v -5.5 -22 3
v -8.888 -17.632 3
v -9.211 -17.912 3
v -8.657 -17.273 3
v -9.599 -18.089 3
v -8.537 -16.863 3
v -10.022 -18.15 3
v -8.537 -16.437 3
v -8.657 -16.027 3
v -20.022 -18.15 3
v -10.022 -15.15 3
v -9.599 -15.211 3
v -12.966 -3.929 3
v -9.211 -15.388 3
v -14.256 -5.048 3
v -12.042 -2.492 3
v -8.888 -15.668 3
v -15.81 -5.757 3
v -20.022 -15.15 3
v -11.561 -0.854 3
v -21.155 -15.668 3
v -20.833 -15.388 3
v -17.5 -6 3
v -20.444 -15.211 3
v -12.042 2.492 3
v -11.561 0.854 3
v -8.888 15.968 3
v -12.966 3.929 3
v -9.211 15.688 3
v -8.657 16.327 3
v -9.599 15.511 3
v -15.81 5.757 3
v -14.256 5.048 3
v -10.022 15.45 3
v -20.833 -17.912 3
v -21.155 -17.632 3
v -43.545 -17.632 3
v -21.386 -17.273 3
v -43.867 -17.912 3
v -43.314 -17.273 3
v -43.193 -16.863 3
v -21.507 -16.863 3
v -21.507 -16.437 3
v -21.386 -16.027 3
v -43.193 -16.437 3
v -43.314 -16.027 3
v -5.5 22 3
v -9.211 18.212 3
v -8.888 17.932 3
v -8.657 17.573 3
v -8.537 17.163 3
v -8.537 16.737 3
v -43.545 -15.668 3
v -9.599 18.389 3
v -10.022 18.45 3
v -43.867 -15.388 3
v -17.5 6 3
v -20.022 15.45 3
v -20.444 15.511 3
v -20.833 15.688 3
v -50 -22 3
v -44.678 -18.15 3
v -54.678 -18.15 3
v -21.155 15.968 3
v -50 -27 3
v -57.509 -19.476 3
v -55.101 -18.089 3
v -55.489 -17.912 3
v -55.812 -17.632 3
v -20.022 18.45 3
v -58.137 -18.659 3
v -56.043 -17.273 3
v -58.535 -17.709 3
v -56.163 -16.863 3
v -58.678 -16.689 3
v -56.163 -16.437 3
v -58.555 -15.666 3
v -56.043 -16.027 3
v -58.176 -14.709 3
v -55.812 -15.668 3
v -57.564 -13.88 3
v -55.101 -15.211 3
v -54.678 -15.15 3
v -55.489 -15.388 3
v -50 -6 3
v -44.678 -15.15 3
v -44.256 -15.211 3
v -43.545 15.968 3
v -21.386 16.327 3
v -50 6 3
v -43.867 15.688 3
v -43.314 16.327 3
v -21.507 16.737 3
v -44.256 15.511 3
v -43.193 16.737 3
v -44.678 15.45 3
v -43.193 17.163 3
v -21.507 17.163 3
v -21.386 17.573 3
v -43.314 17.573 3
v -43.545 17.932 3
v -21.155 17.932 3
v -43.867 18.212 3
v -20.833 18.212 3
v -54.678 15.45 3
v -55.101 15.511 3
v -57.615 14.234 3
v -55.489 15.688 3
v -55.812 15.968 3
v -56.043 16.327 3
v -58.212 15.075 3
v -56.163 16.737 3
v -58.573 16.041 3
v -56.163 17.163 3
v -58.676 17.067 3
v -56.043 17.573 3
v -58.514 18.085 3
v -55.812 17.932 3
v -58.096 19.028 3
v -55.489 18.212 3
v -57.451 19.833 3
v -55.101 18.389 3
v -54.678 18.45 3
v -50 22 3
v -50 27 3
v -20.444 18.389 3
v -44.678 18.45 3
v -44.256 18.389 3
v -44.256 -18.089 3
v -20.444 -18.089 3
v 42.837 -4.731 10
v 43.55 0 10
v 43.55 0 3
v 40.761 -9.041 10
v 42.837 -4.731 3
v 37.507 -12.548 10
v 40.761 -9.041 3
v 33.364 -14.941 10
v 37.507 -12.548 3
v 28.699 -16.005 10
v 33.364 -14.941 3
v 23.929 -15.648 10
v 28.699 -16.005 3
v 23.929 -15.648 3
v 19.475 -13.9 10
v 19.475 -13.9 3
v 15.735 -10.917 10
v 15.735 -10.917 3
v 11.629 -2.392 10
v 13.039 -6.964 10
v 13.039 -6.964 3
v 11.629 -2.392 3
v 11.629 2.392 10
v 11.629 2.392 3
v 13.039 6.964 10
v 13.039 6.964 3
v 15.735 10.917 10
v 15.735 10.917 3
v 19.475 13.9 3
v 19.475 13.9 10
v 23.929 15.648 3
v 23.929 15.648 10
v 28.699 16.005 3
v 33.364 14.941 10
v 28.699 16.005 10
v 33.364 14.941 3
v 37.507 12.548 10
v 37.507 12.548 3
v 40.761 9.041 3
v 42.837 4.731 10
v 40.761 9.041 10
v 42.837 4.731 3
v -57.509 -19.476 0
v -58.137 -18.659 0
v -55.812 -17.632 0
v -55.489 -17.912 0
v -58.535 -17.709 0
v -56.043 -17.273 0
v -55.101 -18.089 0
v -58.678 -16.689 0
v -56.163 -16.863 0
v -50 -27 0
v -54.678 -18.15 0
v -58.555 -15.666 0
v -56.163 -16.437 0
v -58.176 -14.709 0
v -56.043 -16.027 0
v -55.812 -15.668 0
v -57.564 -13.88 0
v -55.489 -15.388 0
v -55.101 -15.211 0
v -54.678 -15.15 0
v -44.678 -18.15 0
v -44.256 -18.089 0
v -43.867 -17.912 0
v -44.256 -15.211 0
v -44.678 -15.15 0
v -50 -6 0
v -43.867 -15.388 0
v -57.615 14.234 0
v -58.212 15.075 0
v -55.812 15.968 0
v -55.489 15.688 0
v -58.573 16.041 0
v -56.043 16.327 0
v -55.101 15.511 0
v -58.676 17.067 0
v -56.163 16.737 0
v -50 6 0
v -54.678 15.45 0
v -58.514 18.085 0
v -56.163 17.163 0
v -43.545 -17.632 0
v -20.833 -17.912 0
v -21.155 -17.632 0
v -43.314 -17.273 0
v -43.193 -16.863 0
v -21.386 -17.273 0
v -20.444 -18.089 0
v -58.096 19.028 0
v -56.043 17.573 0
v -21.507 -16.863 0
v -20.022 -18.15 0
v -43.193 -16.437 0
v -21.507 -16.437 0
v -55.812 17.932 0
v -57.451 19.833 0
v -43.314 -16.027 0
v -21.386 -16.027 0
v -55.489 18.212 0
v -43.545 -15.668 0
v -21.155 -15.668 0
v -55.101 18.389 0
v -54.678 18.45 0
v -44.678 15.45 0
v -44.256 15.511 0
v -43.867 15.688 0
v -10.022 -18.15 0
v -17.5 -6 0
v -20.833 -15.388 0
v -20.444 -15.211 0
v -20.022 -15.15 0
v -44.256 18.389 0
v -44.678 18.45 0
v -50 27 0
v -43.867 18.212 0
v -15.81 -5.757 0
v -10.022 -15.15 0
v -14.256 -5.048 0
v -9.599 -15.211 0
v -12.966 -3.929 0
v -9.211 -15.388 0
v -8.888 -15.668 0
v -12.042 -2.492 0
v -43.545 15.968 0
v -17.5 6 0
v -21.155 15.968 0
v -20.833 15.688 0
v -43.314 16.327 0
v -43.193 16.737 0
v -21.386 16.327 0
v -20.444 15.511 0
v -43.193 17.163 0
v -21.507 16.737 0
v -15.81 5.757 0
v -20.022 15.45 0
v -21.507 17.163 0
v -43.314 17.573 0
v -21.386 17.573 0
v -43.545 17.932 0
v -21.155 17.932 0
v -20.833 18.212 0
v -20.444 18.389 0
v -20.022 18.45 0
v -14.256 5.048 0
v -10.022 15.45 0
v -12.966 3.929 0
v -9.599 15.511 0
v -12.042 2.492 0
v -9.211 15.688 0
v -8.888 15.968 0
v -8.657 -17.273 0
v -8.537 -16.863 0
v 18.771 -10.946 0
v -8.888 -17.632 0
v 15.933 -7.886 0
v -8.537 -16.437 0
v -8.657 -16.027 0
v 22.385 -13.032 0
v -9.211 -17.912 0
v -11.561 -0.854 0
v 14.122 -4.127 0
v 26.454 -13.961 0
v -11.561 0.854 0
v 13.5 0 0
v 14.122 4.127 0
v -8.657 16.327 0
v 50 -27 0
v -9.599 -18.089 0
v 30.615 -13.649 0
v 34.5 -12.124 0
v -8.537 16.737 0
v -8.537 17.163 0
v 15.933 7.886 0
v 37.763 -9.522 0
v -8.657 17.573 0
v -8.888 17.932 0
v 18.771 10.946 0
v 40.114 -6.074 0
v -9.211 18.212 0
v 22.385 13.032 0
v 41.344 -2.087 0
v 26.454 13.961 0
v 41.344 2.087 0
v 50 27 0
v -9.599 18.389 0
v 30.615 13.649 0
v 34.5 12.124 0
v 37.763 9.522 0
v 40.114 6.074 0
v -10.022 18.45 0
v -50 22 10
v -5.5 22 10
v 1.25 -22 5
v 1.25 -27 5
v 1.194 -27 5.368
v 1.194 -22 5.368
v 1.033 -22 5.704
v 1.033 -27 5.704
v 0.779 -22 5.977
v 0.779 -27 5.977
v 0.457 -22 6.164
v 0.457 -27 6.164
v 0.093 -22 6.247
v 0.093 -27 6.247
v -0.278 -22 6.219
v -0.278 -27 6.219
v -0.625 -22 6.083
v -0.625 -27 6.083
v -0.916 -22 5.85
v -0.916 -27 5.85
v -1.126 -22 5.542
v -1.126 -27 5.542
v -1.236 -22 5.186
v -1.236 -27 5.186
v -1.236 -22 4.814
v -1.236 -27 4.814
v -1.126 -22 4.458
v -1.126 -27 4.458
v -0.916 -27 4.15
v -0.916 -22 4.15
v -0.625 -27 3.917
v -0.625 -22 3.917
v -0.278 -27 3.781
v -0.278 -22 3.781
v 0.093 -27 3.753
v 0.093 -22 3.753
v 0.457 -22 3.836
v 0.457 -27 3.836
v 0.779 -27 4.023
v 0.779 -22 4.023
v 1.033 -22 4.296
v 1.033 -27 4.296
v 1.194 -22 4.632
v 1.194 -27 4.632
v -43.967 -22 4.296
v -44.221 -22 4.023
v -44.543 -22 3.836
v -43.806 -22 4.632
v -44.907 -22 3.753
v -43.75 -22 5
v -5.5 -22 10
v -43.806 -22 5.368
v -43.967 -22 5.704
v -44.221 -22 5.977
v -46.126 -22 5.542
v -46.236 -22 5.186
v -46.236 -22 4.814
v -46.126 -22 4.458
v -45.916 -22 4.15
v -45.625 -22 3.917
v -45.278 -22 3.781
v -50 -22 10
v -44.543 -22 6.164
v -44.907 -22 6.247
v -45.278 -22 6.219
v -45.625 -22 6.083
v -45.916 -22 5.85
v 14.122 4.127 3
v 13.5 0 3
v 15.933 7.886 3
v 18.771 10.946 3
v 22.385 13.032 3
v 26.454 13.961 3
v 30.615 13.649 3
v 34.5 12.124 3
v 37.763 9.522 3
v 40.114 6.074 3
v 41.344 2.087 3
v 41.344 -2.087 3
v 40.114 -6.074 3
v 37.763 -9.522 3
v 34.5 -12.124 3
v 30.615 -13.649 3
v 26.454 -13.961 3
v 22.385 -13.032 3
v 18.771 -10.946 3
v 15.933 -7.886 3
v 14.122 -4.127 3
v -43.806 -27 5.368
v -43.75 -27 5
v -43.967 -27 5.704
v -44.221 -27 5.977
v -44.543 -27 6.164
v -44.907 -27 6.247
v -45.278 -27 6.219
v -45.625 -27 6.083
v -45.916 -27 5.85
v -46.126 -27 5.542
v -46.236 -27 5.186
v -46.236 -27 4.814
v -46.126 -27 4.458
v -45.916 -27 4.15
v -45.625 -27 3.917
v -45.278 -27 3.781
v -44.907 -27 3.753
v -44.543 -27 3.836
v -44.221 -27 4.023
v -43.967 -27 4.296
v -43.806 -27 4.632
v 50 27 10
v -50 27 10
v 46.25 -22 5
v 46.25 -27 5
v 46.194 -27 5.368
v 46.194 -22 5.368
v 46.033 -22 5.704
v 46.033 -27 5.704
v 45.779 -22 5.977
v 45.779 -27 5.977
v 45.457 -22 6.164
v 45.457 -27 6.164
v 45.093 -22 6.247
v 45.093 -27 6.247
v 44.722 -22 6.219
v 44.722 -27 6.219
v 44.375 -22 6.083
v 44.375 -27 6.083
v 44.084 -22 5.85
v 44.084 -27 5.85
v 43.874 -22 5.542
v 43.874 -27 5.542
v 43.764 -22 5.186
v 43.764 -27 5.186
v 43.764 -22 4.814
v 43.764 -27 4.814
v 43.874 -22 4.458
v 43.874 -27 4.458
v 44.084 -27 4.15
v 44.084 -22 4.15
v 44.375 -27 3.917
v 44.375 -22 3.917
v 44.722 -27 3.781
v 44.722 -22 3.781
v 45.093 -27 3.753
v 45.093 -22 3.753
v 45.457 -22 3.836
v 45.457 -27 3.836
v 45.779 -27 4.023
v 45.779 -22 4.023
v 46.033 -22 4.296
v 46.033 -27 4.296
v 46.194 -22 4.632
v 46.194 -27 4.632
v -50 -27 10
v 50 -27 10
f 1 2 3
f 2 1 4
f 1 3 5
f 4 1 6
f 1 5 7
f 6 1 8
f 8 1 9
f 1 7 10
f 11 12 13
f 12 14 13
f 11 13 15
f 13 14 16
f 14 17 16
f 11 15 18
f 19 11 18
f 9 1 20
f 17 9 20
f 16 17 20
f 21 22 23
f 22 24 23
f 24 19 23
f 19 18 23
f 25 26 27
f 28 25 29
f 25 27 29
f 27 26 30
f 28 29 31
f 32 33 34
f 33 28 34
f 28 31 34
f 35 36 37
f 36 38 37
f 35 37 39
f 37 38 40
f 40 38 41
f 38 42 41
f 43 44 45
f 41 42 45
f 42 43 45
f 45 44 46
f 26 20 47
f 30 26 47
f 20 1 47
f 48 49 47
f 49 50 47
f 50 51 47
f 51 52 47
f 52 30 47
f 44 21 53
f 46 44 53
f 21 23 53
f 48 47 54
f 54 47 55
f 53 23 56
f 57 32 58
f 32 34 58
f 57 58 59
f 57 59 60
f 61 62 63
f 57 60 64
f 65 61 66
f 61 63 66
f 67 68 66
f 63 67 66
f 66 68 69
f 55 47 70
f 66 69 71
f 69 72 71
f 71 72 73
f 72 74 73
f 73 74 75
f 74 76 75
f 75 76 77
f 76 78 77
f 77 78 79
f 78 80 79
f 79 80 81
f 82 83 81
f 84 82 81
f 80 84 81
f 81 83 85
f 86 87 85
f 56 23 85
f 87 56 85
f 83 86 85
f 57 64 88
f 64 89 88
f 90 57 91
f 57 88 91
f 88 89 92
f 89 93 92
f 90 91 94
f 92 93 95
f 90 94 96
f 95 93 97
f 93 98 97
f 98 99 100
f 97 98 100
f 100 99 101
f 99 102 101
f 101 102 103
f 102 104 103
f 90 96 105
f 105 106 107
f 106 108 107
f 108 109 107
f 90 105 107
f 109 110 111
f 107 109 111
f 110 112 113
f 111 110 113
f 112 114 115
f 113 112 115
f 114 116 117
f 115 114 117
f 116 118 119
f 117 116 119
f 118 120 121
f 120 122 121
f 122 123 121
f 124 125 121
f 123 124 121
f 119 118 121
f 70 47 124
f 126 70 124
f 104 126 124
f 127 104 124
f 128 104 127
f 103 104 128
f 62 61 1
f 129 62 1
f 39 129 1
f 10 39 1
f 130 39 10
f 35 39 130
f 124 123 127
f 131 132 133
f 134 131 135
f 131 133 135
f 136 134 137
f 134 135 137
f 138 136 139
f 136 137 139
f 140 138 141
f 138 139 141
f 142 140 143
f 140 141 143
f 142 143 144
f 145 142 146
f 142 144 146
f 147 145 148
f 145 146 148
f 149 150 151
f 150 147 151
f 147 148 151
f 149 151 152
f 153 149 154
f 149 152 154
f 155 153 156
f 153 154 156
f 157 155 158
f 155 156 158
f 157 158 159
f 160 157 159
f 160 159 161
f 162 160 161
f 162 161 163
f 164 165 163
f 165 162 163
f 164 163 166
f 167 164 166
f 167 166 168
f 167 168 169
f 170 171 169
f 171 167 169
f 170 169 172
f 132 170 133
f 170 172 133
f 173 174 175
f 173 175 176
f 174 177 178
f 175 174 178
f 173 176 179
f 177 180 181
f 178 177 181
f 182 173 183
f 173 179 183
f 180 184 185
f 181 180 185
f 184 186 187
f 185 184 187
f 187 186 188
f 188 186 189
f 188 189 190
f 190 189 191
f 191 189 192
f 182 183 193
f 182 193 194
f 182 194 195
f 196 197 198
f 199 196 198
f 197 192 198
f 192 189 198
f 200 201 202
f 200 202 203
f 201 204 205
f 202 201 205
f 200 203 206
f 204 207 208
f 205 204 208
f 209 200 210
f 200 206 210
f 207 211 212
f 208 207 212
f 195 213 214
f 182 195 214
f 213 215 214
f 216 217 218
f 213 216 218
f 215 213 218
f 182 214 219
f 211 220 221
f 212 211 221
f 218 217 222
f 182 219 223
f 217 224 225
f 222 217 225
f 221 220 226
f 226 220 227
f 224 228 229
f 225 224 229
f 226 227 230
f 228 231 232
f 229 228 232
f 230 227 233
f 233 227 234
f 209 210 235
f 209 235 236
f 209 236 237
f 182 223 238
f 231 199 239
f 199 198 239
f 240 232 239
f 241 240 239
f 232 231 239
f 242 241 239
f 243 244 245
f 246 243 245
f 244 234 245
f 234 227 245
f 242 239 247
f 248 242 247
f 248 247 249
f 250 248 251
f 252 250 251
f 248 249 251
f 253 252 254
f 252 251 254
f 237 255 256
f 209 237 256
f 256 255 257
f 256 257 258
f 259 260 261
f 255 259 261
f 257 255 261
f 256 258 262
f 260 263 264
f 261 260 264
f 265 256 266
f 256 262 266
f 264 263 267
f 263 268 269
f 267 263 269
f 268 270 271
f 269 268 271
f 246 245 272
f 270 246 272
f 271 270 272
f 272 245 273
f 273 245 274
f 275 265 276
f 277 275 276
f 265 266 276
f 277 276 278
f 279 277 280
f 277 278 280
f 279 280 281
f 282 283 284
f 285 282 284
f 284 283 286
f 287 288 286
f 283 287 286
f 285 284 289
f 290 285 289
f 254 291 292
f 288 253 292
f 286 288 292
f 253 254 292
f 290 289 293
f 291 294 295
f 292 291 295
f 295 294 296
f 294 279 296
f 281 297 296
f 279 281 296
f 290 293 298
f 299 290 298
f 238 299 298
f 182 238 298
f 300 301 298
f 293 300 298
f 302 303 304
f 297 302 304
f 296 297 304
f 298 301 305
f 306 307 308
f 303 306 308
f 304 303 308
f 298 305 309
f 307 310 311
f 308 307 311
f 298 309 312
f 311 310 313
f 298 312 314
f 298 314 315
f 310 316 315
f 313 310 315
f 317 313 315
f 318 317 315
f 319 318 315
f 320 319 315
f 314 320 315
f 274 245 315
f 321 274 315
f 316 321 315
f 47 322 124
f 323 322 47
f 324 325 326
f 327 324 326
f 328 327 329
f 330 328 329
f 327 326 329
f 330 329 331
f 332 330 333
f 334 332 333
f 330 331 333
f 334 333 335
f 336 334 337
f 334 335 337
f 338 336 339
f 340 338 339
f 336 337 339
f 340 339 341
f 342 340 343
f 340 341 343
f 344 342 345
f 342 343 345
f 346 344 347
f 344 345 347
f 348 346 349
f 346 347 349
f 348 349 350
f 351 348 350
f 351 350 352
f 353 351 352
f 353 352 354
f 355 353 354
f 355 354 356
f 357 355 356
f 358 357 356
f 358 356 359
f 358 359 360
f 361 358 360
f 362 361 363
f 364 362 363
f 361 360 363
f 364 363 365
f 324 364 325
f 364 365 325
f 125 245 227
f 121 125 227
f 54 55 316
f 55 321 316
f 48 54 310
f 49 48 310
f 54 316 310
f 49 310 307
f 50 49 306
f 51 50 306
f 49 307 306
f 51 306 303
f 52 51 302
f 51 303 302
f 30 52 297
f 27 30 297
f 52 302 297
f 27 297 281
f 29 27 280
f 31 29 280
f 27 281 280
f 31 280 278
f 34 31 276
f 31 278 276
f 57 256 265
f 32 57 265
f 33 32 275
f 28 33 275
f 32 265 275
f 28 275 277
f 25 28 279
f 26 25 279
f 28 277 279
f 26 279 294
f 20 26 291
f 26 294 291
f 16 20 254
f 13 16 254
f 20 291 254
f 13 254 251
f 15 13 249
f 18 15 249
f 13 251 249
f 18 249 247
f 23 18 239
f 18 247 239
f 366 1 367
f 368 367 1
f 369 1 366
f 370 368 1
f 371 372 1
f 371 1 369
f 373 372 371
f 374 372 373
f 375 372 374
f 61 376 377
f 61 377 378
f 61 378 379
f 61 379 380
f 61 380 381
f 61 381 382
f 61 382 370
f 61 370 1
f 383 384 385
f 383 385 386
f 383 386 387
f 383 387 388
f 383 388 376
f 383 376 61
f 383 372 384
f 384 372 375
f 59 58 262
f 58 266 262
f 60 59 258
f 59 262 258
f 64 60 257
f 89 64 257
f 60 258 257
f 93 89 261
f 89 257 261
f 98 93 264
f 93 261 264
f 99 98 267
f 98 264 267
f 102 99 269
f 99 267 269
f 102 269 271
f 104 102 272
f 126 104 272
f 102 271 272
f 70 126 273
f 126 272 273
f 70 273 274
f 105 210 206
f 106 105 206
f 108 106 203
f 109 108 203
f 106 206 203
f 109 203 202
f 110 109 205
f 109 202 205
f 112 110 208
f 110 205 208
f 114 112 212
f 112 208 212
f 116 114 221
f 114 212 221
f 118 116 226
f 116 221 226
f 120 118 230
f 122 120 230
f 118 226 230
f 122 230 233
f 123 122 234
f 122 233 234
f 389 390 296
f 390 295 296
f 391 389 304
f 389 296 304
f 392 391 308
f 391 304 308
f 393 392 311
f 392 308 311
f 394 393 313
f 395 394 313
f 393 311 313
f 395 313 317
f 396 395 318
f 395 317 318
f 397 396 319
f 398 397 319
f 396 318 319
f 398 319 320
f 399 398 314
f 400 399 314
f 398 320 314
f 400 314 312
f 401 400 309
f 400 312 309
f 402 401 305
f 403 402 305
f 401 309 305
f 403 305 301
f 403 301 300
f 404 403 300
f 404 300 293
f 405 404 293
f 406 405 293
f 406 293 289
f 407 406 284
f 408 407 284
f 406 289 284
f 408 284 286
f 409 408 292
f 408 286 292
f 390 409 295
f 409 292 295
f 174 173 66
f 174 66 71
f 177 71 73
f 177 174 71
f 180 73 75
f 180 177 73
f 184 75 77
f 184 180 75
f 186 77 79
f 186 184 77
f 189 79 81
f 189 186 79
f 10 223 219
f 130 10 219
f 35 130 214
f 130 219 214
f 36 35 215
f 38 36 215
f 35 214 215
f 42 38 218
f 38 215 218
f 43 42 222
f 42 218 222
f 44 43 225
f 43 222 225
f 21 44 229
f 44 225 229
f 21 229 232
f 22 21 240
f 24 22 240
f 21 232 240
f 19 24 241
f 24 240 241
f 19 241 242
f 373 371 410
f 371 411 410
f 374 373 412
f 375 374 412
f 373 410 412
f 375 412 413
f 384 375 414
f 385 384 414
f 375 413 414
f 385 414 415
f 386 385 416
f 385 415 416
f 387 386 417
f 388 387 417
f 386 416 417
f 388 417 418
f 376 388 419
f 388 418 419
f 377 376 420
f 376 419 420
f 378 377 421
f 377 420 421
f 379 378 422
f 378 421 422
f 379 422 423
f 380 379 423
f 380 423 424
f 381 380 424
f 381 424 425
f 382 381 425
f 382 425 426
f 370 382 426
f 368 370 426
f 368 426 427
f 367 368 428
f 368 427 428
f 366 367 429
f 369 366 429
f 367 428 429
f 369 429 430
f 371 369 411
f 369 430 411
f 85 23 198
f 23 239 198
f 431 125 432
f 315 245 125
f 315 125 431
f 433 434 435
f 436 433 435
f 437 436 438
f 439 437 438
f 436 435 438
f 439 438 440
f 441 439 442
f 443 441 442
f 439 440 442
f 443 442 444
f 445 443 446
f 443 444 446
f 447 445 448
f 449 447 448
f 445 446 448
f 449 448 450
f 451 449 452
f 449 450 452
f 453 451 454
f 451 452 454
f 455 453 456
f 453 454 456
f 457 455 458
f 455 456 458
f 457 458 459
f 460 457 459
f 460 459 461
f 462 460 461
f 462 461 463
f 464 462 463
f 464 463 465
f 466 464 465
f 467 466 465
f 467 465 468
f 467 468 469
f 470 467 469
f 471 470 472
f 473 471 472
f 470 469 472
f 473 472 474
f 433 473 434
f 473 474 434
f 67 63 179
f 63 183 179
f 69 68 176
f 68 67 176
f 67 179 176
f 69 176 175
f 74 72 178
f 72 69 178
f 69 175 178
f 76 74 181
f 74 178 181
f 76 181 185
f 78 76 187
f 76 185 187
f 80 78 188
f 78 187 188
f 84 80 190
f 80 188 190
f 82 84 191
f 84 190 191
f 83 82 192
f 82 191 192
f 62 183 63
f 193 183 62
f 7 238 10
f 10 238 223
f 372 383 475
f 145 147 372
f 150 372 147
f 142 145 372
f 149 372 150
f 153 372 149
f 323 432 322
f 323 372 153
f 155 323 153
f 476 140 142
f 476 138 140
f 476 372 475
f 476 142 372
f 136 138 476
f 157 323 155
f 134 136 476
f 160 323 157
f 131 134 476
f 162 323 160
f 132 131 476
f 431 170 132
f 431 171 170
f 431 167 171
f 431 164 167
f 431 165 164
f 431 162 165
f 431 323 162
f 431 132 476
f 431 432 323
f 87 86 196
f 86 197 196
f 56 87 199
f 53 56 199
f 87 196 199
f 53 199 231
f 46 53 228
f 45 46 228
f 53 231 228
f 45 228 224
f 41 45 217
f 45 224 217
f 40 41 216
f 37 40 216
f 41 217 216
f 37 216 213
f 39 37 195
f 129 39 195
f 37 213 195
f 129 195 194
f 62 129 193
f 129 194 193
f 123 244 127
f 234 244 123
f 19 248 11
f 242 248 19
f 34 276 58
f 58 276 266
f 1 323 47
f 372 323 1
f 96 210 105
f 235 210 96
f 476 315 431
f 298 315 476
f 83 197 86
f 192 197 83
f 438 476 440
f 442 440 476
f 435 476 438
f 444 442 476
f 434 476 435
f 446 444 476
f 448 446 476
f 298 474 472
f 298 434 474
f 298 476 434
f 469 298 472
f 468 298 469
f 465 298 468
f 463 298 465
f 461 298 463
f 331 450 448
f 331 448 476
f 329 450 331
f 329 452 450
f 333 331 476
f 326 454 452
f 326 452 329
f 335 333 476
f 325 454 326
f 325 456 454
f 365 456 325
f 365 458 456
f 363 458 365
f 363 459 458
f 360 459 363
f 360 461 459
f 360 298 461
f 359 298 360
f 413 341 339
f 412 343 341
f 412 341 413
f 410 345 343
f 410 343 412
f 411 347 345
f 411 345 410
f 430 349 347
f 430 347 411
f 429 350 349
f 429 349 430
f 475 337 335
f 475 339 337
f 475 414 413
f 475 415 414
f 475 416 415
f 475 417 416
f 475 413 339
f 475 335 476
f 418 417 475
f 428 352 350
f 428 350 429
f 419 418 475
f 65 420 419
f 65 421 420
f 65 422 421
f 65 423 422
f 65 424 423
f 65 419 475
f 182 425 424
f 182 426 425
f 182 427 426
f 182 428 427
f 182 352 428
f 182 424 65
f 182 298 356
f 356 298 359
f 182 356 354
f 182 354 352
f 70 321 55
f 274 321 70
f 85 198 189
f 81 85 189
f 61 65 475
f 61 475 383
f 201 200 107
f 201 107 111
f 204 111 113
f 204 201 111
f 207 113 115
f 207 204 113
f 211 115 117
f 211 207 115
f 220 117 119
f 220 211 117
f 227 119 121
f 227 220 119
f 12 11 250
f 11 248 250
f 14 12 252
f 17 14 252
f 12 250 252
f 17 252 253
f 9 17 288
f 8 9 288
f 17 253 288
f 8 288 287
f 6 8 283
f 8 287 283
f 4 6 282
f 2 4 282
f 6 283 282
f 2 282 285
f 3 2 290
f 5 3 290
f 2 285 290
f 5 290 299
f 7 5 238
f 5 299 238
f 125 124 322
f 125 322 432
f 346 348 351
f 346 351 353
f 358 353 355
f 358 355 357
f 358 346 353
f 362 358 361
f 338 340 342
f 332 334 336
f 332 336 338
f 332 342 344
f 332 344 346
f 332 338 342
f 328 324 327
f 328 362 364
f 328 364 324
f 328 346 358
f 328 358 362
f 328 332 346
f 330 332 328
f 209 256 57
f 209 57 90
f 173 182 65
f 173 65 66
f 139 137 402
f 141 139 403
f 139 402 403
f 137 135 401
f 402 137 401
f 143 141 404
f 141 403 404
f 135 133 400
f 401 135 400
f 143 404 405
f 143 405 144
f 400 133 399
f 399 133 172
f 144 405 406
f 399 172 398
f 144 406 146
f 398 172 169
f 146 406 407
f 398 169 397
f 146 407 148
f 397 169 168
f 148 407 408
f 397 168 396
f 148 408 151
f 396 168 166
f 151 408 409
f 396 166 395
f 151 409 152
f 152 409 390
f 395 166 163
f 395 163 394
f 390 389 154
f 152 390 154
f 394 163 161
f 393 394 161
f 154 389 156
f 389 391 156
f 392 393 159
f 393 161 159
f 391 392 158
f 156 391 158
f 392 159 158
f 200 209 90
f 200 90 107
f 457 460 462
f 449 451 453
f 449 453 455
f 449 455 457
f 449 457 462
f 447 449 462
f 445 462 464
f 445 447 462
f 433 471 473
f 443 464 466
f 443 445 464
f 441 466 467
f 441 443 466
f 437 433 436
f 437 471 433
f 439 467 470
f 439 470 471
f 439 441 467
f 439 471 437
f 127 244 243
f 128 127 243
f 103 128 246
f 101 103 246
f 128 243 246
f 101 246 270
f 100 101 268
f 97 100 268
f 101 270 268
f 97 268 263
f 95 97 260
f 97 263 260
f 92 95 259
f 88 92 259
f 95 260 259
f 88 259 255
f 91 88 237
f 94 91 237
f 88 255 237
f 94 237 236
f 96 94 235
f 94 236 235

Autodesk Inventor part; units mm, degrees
ref_plane "YZ Plane" through (0, 0, 0) normal (1, 0, 0) x (0, 1, 0)
ref_plane "XZ Plane" through (0, 0, 0) normal (0, 1, 0) x (-1, 0, 0)
sketch "Эскиз1" plane through (0, 0, 0) normal (0, 0, 1) x (1, 0, 0)
  line L0 (50, -27) -> (-50, -27)
  line L1 (-50, -27) -> (-50, 27)
  line L2 (-50, 27) -> (50, 27)
  line L3 (50, 27) -> (50, -27)
  line L4 (50, -27) -> (-50, 27) construction
  line L5 (-50, -27) -> (50, 27) construction
  circle A0 centre (27.5, 0) radius 16.05
  point P0 (0, 0)
  point P1 (0, 0)
  dimension "d0" = 100
  dimension "d1" = 54
  dimension "d2" = 32.1
  dimension "d3" = 22.5
extrude "Выдавливание1" add sketch "Эскиз1" along normal blind 10
sketch "Эскиз2" plane through (0, 0, 0) normal (0, 0, -1) x (-1, 0, 0)
  circle A0 centre (-27.5, 0) radius 16.05 projected
  circle A1 centre (-27.5, 0) radius 14
  point P0 (0, 0)
  dimension "d6" = 28
extrude "Выдавливание2" add sketch "Эскиз2" against normal blind 3
sketch "Эскиз3" plane through (0, 0, 0) normal (0, 0, -1) x (-1, 0, 0)
  circle A0 centre (-27.5, 0) radius 14 projected
  circle A1 centre (17.5, 0) radius 6
  line L0 (17.5, 6) -> (50, 6)
  line L1 (50, -27) -> (50, 27) projected
  line L2 (17.5, -6) -> (50, -6)
  line L3 (50, -6) -> (50, 6)
  point P0 (0, 0)
  dimension "d9" = 12
  dimension "d10" = 45
extrude "Выдавливание3" cut sketch "Эскиз3" against normal blind 10 contours A1 | A1 L0 L1 L2
sketch "Эскиз4" plane through (0, 0, 10) normal (0, 0, 1) x (1, 0, 0)
  line L0 (-49.5, 22) -> (-5.5, 22)
  line L1 (-5.5, 22) -> (-5.5, -22)
  line L2 (-5.5, -22) -> (-49.5, -22)
  line L3 (-49.5, -22) -> (-49.5, 22)
  line L4 (-49.5, 22) -> (-5.5, -22) construction
  line L5 (-5.5, 22) -> (-49.5, -22) construction
  arc A0 (-17.5, -6) -> (-17.5, 6) centre (-17.5, 0) ccw projected
  line L6 (-49.5, -22) -> (-62.5164, -22)
  line L7 (-62.5164, -22) -> (-62.5164, 22)
  line L8 (-62.5164, 22) -> (-49.5, 22)
  line L9 (-49.5, 22) -> (-49.5, -22)
  point P0 (0, 0)
  point P1 (-27.5, 0)
  point P2 (-27.5, 0)
  dimension "d13" = 44
  dimension "d14" = 44
  dimension "d15" = 10
  dimension "d16" = 44
extrude "Выдавливание4" cut sketch "Эскиз4" against normal blind 7
sketch "Эскиз8" plane through (-50, -27, 10) normal (0, -1, 0) x (1, 0, 0)
  circle A0 centre (95, -5) radius 1.25
  circle A1 centre (50, -5) radius 1.25
  circle A2 centre (5, -5) radius 1.25
  line L0 (100, -10) -> (100, 0) projected
  line L1 (0, -10) -> (0, 0) projected
  line L2 (100, -10) -> (0, -10) projected
  point P0 (50, -10)
  point P1 (100, -5)
  point P2 (0, -7)
  point P3 (50, -10)
  dimension "d44" = 2.5
  dimension "d45" = 2.5
  dimension "d46" = 2.5
  dimension "d47" = 5
  dimension "d48" = 5
extrude "Выдавливание9" cut sketch "Эскиз8" against normal up to surface (5 mm away)
sketch "Эскиз9" plane through (0, 0, 0) normal (0, 0, -1) x (-1, 0, 0)
  circle A0 centre (10.0218, 16.95) radius 1.5
  circle A1 centre (44.6782, 16.95) radius 1.5
  circle A2 centre (44.6782, -16.65) radius 1.5
  circle A3 centre (10.0218, -16.65) radius 1.5
  line L0 (-50, 27) -> (50, 27) projected
  line L1 (-50, -27) -> (-50, 27) projected
  line L2 (50, -27) -> (-50, -27) projected
  line L3 (50, -22) -> (50, -6) projected
  line L4 (50, 6) -> (50, 22) projected
  point P0 (0, 0)
  dimension "d75" = 10.05
  dimension "d76" = 60.0218
  dimension "d77" = 3
  dimension "d78" = 10.05
  dimension "d79" = 10.35
  dimension "d80" = 10.35
  dimension "d82" = 5.3218
  dimension "d83" = 3
  dimension "d84" = 3
  dimension "d85" = 3
extrude "Выдавливание10" cut sketch "Эскиз9" against normal blind 10
sketch "Эскиз10" plane through (0, 0, 0) normal (0, 0, -1) x (-1, 0, 0)
  circle A0 centre (10.0218, 16.95) radius 1.5 projected
  line L0 (10.0218, 18.45) -> (20.0218, 18.45)
  line L1 (10.0218, 15.45) -> (20.0218, 15.45)
  circle A1 centre (20.0218, 16.95) radius 1.5
  circle A2 centre (10.0218, -16.65) radius 1.5 projected
  line L2 (10.0218, -15.15) -> (20.0218, -15.15)
  line L3 (10.0218, -18.15) -> (20.0218, -18.15)
  circle A3 centre (20.0218, -16.65) radius 1.5
  line L4 (20.0218, 18.45) -> (20.0218, 15.45)
  line L5 (10.0218, 18.45) -> (10.0218, 15.45)
  line L6 (10.0218, -15.15) -> (10.0218, -18.15)
  line L7 (20.0218, -15.15) -> (20.0218, -18.15)
  point P0 (0, 0)
  dimension "d53" = 10
  dimension "d54" = 10
  dimension "d55" = 10
  dimension "d56" = 10
extrude "Выдавливание11" cut sketch "Эскиз10" against normal blind 10 contours A0 L5 | A0 L0 A1 L1 | L4 A1 | A1 L4 | A2 L2 A3 L3 | L7 A3 | A3 L7 picked at (10.3335, 17.3409)
sketch "Эскиз11" plane through (0, 0, 0) normal (0, 0, -1) x (-1, 0, 0)
  line L0 (-50, 27) -> (50, 27) projected
  line L1 (50, 6) -> (50, 27) projected
  line L2 (50, 27) -> (50, 6)
  circle A0 centre (44.6782, 16.95) radius 1.5 projected
  line L3 (44.6782, 18.45) -> (54.6782, 18.45)
  line L4 (54.6782, 18.45) -> (54.6782, 15.45)
  line L5 (54.6782, 15.45) -> (44.6782, 15.45)
  arc A1 (54.6782, 15.45) -> (54.6782, 18.45) centre (54.6782, 16.95) ccw
  arc A2 (57.6149, 14.2342) -> (57.4511, 19.8328) centre (54.6782, 16.95) ccw
  line L6 (50, 27) -> (57.4511, 19.8328)
  line L7 (50, 6) -> (57.6149, 14.2342)
  point P0 (0, 0)
  point P1 (50, 16.5)
  dimension "d60" = 10
  dimension "d61" = 3
  dimension "d62" = 8
extrude "Выдавливание12" add sketch "Эскиз11" against normal up to surface (3 mm away) contours L1 L5 A1 L3 L6 A2 L7 | L1 L3 L4 L5
extrude "Выдавливание13" cut sketch "Эскиз11" against normal blind 10 contours L5 A0 L3 L1 | L1 L3 L4 L5
ref_plane "РабПлоскость1" through (-50, 0, 0) normal (0, 1, 0) x (1, 0, 0)
sketch "Эскиз12" plane through (0, 0, 0) normal (0, 0, -1) x (-1, 0, 0)
  line L0 (50, -6) -> (17.5, -6) projected
  line L1 (50, -22) -> (50, -27) projected
  line L2 (50, -6) -> (50, -27)
  circle A0 centre (44.6782, -16.65) radius 1.5 projected
  line L3 (44.6782, -15.15) -> (54.6782, -15.15)
  line L4 (54.6782, -18.15) -> (54.6782, -15.15)
  line L5 (54.6782, -18.15) -> (44.6782, -18.15)
  circle A1 centre (54.6782, -16.65) radius 1.5
  arc A2 (57.5094, -19.4756) -> (57.5639, -13.8801) centre (54.6782, -16.65) ccw
  line L6 (50, -22) -> (50, -6) projected
  line L7 (50, -6) -> (57.5639, -13.8801)
  line L8 (50, -27) -> (57.5094, -19.4756)
  point P0 (0, 0)
  dimension "d67" = 10
  dimension "d68" = 10
  dimension "d69" = 3
  dimension "d70" = 8
extrude "Выдавливание14" add sketch "Эскиз12" against normal up to surface (3 mm away) contours L2 L5 A1 L3 L7 A2 L8 L1 | L2 L3 A1 L5
extrude "Выдавливание15" cut sketch "Эскиз12" against normal blind 10 contours L5 A0 L3 L2 | L2 L3 A1 L5 | A1 L4 | L4 A1
equation "\"d44\" = d45"
equation "\"d45\" = d46"
properties part number "крепление подшипникового блока левая часть"
